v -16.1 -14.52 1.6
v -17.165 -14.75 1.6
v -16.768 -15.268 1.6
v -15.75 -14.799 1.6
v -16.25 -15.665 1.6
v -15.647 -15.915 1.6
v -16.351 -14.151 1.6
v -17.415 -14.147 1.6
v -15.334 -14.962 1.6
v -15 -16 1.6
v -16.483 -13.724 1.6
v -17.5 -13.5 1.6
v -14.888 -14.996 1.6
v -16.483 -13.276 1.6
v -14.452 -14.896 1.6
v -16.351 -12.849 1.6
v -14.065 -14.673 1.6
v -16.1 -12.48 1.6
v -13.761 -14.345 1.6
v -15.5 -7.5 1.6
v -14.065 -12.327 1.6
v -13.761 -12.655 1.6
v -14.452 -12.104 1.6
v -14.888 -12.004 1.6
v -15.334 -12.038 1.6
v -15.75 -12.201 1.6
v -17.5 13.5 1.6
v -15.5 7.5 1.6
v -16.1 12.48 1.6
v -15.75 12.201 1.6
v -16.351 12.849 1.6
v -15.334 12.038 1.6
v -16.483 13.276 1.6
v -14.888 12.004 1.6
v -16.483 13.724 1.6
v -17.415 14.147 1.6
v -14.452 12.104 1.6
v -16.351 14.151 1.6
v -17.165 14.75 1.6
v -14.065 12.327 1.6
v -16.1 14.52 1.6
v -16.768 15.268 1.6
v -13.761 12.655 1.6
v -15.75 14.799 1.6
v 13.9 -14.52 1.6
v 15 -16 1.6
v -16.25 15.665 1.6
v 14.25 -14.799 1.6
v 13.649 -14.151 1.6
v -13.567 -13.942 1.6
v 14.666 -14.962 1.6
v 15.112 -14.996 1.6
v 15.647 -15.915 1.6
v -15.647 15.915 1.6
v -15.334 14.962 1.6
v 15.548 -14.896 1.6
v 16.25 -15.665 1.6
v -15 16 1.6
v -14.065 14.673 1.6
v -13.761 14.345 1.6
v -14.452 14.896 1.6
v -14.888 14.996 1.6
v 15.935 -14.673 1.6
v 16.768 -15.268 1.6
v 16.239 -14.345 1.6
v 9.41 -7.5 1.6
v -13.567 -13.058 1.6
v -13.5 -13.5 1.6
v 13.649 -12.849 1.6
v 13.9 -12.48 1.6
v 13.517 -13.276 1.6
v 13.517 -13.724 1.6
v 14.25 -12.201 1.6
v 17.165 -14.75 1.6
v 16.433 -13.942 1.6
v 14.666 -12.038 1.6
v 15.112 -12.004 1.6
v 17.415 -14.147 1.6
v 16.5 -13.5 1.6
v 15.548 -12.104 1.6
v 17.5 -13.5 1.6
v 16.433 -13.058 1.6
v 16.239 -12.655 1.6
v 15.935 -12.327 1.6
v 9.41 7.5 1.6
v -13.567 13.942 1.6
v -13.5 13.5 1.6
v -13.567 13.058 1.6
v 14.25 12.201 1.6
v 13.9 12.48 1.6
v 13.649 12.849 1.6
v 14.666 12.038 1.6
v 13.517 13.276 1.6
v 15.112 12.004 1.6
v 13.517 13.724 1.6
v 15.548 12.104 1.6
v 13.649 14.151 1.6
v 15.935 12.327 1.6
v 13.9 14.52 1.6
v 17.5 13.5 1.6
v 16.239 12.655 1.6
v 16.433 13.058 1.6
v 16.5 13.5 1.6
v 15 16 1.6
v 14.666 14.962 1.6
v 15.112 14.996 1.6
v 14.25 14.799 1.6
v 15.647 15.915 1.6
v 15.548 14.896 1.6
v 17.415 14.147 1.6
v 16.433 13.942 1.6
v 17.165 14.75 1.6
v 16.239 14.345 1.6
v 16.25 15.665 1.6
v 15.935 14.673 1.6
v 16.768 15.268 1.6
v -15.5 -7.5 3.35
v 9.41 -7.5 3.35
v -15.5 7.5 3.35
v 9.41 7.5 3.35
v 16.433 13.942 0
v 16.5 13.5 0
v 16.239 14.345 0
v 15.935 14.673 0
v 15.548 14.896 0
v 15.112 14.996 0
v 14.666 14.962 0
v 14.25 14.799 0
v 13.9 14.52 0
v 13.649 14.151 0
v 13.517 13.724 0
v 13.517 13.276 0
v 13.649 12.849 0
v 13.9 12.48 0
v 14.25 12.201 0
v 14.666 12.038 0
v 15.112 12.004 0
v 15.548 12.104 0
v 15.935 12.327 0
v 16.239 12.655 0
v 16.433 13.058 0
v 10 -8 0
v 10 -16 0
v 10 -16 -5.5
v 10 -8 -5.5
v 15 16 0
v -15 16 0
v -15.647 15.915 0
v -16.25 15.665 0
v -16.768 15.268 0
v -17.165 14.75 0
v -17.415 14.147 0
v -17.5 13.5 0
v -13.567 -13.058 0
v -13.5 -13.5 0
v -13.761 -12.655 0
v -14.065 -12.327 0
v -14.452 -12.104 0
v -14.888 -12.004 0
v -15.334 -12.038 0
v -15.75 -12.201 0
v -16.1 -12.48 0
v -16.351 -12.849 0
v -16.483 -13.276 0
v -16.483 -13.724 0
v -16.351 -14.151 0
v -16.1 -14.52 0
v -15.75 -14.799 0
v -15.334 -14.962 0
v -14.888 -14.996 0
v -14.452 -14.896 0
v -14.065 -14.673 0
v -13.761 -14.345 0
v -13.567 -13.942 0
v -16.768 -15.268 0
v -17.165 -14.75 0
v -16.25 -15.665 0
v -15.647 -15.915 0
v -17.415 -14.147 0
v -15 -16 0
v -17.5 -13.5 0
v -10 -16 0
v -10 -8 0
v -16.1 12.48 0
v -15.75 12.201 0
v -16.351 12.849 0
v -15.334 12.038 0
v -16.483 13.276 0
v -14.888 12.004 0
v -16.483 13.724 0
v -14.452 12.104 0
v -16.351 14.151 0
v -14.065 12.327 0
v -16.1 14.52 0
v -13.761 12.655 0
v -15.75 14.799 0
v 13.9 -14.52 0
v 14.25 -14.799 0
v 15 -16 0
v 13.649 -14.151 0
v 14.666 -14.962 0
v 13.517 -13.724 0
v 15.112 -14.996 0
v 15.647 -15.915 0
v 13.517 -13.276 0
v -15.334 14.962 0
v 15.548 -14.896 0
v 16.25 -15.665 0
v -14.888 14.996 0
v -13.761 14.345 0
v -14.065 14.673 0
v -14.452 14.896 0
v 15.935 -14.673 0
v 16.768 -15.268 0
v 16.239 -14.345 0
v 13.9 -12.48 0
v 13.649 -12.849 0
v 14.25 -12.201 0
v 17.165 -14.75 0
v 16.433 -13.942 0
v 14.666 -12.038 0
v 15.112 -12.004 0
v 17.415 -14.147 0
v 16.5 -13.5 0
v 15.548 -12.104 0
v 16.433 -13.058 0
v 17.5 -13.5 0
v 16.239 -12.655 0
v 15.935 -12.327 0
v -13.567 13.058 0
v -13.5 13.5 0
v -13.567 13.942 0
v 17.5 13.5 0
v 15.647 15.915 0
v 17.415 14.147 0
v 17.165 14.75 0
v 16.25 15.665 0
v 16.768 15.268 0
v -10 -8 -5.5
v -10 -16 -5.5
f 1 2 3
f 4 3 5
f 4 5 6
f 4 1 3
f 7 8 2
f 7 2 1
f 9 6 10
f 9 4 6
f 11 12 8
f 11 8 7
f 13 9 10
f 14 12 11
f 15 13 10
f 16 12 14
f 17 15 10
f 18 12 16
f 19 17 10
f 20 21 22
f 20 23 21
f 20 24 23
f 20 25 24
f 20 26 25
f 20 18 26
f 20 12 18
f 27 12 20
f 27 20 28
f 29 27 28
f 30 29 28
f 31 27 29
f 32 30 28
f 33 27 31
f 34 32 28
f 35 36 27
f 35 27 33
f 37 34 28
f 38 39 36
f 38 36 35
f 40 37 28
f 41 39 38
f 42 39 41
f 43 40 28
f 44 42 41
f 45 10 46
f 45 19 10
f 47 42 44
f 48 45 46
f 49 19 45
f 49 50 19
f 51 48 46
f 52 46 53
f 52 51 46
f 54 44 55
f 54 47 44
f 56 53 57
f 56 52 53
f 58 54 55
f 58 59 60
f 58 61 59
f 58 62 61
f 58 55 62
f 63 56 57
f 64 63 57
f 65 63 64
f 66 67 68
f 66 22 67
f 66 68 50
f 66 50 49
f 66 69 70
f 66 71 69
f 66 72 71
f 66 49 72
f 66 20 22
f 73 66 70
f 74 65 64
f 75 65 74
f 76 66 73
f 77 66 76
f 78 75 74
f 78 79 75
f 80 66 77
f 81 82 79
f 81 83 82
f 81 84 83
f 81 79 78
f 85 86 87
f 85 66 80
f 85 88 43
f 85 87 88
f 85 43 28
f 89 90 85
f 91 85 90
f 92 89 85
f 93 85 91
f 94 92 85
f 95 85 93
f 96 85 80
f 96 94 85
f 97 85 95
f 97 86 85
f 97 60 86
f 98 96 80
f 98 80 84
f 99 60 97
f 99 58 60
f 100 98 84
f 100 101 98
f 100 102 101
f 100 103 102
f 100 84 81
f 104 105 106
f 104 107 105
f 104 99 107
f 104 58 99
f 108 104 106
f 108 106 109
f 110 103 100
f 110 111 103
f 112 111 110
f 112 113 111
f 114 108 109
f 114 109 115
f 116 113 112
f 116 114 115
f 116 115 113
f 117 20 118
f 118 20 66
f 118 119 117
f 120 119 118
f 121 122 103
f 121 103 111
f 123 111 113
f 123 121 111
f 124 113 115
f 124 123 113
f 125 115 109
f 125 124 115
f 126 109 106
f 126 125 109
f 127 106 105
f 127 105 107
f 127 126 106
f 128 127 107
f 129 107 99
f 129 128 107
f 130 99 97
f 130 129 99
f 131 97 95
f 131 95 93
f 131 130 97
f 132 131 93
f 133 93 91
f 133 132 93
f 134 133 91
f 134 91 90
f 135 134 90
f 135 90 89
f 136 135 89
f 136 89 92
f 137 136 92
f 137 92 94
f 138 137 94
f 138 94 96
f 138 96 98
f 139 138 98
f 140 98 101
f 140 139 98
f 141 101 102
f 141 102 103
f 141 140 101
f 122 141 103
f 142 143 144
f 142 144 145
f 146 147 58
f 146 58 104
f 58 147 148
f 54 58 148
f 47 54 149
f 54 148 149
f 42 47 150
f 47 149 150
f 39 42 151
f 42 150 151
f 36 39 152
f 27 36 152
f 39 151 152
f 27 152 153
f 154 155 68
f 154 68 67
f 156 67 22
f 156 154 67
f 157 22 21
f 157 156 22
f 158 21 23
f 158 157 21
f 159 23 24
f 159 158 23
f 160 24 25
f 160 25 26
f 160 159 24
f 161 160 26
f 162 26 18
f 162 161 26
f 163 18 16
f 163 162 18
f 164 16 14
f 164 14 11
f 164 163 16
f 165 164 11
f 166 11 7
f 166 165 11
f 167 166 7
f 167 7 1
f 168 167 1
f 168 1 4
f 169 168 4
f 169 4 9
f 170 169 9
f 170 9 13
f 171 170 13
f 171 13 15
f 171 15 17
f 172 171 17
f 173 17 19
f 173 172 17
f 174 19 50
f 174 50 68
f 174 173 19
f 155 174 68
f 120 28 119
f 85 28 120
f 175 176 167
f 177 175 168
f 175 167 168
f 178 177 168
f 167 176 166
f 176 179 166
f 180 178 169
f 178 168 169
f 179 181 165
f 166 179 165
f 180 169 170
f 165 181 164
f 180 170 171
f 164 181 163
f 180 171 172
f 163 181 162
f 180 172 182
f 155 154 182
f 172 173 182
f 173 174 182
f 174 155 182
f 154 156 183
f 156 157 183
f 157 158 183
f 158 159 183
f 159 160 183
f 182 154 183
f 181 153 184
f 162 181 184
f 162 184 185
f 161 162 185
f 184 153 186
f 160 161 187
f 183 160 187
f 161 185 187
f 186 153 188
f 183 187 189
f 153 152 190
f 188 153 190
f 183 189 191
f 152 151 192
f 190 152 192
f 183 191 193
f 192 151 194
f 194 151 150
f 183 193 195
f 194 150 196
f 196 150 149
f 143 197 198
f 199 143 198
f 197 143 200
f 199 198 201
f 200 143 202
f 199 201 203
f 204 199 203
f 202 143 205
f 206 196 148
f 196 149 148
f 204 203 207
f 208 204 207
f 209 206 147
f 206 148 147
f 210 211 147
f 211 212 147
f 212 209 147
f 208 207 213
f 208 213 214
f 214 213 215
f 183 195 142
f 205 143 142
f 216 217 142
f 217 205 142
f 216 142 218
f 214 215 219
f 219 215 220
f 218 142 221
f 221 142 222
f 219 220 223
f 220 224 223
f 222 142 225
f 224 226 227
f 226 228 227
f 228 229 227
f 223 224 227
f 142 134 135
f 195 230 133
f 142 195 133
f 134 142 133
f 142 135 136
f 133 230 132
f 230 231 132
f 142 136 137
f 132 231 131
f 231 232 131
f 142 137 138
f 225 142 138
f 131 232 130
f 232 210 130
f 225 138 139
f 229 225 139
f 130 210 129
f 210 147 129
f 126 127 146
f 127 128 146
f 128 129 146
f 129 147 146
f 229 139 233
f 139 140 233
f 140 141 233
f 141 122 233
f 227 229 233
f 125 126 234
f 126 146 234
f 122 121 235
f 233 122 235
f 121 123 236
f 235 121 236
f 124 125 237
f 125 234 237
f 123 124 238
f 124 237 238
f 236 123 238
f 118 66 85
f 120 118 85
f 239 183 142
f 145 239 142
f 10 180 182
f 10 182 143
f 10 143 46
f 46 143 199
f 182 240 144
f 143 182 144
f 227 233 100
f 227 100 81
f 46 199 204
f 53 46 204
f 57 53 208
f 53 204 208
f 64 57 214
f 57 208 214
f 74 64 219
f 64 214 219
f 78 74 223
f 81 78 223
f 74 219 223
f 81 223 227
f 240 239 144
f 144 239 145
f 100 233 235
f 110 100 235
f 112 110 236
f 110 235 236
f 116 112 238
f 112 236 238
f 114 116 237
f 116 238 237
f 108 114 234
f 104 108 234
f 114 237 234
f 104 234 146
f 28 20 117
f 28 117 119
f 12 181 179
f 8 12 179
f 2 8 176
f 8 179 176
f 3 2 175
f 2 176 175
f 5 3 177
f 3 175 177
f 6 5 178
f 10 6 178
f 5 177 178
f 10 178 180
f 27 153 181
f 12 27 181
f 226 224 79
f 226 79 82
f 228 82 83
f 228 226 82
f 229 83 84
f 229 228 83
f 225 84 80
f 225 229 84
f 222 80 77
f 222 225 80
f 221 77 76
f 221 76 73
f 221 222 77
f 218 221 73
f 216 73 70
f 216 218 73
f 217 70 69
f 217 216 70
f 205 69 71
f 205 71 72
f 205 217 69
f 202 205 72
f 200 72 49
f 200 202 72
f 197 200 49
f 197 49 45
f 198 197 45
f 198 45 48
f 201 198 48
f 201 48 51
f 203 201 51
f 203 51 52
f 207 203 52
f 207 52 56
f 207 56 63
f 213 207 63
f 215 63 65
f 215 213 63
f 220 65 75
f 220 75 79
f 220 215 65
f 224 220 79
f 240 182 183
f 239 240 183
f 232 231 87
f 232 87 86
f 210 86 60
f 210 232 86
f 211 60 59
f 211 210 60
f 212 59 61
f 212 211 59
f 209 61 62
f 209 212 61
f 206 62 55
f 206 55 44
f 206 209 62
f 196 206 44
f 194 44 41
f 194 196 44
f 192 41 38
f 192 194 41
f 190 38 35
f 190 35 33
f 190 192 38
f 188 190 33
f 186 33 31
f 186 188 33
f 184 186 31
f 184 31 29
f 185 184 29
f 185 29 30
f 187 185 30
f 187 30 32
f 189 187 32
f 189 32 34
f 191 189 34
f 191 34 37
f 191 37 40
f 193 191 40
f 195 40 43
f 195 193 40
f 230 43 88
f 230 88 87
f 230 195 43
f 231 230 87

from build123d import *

# Parameters (mm, degrees)
SKETCH_R     = 1.5
PAD_DEPTH    = 1.6
SKETCH001_W  = 24.91
SKETCH001_H  = 15
PAD001_DEPTH = 1.75
SKETCH002_W  = 20
SKETCH002_H  = 8
PAD002_DEPTH = 5.5


with BuildPart() as part:
    # Sketch → Pad (new body)
    with BuildSketch(Plane.XY):
        with BuildLine():
            ThreePointArc((-15, 16), (-16.767767, 15.267767), (-17.5, 13.5))
            Line((-17.5, 13.5), (-17.5, -13.5))
            ThreePointArc((-17.5, -13.5), (-16.767767, -15.267767), (-15, -16))
            Line((-15, -16), (15, -16))
            ThreePointArc((15, -16), (16.767767, -15.267767), (17.5, -13.5))
            Line((17.5, 13.5), (17.5, -13.5))
            ThreePointArc((17.5, 13.5), (16.767767, 15.267767), (15, 16))
            Line((-15, 16), (15, 16))
        make_face()
        with Locations((-15, 13.5)):
            Circle(SKETCH_R, mode=Mode.SUBTRACT)
        with Locations((15, 13.5)):
            Circle(SKETCH_R, mode=Mode.SUBTRACT)
        with Locations((15, -13.5)):
            Circle(SKETCH_R, mode=Mode.SUBTRACT)
        with Locations((-15, -13.5)):
            Circle(SKETCH_R, mode=Mode.SUBTRACT)
    extrude(amount=PAD_DEPTH)

    # Sketch001 → Pad001 (join)
    with BuildSketch(Plane.XY.offset(1.6)):
        with Locations((-3.045, 0)):
            Rectangle(SKETCH001_W, SKETCH001_H)
    extrude(amount=PAD001_DEPTH)

    # Sketch002 → Pad002 (join)
    with BuildSketch(Plane.XY):
        with Locations((0, -12)):
            Rectangle(SKETCH002_W, SKETCH002_H)
    extrude(amount=-PAD002_DEPTH)


solid = part.part
